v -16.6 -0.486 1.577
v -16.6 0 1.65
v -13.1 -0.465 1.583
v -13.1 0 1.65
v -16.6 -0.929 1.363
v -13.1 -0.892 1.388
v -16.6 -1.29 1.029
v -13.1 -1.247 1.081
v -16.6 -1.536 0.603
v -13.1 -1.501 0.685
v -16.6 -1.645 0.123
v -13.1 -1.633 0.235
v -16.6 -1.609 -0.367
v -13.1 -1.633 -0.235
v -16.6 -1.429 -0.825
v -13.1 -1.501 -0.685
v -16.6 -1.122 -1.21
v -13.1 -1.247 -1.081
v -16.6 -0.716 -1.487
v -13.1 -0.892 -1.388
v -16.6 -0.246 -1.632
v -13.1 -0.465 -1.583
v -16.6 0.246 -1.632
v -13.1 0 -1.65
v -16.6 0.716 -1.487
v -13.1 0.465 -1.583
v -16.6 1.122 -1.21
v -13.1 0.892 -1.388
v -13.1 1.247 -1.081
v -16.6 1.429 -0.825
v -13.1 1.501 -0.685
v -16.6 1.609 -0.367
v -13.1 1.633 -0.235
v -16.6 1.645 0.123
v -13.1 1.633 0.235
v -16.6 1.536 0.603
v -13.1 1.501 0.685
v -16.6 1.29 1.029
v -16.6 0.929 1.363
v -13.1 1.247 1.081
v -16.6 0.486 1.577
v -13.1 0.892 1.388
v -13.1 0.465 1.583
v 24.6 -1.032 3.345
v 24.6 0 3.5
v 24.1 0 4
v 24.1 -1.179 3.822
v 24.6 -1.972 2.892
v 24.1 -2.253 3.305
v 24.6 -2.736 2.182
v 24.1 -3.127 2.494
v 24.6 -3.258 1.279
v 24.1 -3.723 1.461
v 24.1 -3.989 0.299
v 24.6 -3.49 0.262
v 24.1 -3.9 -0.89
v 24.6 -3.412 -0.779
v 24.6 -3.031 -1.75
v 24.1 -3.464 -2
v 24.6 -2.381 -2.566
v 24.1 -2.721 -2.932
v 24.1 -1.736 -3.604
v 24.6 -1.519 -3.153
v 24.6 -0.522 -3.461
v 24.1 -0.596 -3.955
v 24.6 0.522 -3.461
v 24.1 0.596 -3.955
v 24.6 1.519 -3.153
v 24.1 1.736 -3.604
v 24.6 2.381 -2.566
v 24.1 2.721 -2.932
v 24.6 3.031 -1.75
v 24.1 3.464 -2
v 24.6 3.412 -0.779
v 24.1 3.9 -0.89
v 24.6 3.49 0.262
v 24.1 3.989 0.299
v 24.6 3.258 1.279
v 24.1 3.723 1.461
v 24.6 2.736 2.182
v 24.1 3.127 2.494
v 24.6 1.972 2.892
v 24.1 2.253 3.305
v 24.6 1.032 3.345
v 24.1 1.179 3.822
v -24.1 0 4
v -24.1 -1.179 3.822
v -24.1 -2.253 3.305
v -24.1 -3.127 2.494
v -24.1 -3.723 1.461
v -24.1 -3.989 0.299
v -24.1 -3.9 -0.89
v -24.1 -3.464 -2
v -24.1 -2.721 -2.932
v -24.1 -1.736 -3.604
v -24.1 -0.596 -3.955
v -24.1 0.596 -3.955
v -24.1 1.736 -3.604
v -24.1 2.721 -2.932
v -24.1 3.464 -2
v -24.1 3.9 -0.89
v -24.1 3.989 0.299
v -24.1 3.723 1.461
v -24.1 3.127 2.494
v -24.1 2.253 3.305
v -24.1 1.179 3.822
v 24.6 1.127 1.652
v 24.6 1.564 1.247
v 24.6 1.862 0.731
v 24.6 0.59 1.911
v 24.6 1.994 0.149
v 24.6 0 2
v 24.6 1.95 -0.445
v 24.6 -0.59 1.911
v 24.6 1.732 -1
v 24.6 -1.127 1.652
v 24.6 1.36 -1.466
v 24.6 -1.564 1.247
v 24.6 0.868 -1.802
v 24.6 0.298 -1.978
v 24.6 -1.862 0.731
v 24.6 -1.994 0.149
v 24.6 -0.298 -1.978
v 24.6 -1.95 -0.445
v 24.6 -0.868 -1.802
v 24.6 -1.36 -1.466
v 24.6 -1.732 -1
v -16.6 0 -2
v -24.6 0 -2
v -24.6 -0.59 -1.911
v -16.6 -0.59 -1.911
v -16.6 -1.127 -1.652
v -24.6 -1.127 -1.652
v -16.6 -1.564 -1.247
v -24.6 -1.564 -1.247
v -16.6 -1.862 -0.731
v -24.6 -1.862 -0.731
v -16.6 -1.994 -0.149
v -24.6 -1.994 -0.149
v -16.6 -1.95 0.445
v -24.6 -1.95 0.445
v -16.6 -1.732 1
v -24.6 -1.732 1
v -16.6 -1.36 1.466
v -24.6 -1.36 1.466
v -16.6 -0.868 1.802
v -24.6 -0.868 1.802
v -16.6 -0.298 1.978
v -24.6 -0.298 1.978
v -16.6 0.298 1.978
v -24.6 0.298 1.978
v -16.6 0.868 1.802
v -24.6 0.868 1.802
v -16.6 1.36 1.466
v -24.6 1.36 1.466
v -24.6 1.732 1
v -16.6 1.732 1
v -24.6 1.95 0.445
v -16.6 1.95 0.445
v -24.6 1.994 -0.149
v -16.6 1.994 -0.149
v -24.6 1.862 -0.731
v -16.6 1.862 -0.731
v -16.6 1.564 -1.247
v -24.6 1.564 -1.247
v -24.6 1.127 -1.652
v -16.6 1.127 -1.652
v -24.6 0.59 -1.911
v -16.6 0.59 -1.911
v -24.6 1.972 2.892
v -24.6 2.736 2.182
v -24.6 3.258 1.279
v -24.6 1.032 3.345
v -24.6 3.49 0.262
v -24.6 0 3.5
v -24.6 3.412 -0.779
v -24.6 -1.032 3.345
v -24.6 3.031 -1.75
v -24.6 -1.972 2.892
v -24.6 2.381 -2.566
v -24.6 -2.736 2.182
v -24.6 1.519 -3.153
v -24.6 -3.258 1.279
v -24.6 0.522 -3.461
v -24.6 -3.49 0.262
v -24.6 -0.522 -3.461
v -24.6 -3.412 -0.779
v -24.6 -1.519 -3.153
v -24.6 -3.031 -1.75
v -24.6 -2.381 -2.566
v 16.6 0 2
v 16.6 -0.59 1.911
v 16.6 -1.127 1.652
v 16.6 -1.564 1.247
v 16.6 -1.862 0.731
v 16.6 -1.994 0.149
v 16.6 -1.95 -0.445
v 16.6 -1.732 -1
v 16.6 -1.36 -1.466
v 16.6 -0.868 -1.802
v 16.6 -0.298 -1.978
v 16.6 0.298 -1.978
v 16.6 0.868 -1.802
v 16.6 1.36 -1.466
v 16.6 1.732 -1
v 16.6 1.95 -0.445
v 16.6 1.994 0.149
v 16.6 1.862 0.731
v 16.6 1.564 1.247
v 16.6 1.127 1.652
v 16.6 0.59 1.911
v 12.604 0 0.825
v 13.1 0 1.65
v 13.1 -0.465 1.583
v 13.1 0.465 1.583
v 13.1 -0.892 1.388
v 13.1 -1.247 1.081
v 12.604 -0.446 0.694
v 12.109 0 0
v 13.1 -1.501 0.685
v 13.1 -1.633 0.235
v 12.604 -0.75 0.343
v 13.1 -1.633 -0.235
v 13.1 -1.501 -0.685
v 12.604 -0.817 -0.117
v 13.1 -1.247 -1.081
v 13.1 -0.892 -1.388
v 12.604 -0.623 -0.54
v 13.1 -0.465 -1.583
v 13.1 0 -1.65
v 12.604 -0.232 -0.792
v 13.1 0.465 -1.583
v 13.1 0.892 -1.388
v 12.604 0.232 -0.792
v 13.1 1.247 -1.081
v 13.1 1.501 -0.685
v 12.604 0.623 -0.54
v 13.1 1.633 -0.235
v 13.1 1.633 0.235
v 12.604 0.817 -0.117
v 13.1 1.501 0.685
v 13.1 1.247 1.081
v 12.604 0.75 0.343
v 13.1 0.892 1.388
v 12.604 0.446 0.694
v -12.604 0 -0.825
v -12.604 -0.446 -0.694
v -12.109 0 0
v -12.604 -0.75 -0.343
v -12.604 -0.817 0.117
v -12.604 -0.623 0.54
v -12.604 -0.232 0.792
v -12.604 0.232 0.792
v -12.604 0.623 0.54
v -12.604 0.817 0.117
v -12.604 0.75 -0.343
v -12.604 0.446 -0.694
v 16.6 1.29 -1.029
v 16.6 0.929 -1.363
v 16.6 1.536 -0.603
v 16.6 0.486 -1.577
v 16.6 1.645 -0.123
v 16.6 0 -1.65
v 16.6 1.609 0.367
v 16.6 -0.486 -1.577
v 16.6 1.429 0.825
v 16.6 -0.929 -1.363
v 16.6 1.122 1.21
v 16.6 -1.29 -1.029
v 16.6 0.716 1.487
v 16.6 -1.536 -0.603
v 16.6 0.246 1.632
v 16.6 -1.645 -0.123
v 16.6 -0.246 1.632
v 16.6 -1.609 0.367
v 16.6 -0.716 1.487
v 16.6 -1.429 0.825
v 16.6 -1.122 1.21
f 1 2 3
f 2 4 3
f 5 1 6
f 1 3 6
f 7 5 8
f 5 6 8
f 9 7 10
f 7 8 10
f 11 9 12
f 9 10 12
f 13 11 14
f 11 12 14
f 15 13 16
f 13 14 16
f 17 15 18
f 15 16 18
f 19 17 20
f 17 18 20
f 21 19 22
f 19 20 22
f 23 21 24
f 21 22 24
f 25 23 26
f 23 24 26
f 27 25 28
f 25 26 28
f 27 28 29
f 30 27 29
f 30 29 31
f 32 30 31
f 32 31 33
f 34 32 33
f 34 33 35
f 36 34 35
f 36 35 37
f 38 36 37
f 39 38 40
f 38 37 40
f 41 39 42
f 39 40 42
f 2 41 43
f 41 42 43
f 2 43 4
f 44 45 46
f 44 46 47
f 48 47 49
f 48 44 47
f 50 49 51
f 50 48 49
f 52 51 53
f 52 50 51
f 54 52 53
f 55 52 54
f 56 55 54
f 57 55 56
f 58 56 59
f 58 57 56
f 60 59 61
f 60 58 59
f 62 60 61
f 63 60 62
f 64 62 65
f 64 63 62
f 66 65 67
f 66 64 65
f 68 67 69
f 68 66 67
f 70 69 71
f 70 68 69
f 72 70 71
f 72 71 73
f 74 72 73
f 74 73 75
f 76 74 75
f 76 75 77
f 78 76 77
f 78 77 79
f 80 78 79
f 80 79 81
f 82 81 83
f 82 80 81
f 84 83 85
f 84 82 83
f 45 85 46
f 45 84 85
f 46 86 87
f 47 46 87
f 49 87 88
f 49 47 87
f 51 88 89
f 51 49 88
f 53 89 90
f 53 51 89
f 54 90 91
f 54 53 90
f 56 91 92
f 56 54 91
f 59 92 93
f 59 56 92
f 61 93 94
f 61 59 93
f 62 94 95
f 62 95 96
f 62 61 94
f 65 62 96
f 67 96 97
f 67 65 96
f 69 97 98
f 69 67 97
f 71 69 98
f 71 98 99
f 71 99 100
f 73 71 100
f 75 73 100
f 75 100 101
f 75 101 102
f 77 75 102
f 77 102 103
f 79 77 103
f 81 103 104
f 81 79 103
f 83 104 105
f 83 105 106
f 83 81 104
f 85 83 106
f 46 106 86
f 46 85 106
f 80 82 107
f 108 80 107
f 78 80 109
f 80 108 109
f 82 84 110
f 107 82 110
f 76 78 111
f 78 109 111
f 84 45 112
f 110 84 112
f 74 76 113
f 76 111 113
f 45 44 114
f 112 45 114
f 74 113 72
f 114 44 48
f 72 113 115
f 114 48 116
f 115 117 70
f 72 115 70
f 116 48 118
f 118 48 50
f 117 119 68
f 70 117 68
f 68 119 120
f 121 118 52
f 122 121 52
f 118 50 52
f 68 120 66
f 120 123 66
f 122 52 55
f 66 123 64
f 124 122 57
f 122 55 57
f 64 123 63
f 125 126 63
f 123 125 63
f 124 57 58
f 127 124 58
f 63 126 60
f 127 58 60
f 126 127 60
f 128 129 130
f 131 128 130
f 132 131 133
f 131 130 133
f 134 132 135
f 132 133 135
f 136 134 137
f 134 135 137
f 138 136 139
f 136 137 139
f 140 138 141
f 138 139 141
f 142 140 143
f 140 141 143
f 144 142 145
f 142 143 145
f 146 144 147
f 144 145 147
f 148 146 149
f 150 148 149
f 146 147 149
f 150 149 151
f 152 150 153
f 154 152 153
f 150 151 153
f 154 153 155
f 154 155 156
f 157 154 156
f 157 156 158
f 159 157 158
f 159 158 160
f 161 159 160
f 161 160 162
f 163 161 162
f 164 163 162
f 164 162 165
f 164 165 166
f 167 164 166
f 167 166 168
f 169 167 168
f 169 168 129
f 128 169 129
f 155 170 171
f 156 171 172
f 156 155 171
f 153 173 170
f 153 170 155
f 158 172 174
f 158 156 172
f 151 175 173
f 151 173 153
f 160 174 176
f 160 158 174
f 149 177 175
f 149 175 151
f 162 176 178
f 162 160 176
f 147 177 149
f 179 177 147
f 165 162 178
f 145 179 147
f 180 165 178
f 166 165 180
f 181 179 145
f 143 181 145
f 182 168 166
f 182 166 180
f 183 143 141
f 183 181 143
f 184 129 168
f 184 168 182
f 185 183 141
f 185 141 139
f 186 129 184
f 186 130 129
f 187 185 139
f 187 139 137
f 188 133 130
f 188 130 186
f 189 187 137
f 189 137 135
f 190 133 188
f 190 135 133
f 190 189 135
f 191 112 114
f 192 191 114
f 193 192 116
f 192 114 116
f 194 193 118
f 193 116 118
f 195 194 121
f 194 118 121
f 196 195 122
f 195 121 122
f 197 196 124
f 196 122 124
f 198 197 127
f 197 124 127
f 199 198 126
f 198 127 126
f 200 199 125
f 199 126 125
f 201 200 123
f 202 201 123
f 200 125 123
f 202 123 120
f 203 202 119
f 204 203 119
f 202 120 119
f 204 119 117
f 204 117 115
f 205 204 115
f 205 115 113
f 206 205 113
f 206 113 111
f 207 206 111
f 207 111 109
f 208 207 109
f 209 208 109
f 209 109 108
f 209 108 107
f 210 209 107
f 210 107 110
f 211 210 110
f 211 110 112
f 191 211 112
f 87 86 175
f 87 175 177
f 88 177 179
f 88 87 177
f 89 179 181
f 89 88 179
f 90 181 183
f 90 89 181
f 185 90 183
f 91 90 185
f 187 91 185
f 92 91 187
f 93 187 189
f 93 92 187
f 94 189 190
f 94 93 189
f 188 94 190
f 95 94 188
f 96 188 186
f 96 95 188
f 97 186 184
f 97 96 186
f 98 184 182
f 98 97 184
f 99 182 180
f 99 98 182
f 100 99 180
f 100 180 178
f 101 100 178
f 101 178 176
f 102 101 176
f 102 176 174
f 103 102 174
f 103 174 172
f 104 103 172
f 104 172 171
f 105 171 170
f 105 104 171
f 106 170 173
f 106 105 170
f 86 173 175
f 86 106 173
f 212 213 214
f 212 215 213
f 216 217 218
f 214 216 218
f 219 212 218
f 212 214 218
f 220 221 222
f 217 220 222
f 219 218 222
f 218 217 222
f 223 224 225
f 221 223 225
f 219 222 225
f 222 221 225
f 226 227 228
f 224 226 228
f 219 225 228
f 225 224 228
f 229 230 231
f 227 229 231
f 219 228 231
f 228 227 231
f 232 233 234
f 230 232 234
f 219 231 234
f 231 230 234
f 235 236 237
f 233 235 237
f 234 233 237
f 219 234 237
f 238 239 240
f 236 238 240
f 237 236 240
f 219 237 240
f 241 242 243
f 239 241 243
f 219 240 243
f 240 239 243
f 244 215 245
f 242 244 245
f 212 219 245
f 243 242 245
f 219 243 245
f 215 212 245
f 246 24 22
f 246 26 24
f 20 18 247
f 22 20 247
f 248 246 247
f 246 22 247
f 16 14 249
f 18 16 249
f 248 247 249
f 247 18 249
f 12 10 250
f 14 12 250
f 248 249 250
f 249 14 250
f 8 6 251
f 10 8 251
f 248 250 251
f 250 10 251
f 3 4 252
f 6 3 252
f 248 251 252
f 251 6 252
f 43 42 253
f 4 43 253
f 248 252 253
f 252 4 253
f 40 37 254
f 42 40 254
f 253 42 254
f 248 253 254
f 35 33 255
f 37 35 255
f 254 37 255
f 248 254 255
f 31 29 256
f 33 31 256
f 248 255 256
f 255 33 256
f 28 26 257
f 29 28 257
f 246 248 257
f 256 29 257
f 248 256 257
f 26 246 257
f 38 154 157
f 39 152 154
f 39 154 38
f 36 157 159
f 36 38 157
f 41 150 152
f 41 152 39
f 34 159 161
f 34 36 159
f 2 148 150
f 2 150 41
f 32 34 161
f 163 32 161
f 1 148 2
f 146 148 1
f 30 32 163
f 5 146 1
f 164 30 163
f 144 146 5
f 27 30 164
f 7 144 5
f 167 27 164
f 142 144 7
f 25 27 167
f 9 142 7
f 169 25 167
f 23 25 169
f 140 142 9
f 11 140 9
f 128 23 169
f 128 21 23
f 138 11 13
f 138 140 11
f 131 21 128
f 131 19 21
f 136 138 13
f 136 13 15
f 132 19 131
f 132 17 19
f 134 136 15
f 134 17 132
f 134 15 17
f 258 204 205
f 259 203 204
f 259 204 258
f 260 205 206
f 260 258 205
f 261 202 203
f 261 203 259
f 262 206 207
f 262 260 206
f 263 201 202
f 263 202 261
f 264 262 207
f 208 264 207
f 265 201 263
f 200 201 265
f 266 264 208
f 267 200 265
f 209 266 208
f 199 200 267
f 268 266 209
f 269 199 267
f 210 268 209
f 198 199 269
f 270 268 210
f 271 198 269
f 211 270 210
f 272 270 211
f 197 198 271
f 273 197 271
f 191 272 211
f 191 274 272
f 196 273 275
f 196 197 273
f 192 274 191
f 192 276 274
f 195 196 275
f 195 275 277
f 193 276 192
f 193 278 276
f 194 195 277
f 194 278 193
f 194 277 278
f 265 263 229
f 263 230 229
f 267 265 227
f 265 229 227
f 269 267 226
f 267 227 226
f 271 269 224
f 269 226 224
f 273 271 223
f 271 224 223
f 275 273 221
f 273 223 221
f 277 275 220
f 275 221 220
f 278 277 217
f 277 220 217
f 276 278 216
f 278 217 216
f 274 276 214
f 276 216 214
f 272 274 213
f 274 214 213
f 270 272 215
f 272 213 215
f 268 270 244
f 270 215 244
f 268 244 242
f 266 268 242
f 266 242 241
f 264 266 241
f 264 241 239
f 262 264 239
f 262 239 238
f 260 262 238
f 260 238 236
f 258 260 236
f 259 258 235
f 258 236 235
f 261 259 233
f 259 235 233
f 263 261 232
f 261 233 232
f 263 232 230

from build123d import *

# Parameters (mm, degrees)
SKETCH_1_W                     = 49.2
SKETCH_1_H                     = 4
M4X0_7_1_D                     = 3.3
M4X0_7_1_DEPTH                 = 11.5
M4X0_7_1_CBORE_D               = 4
M4X0_7_1_CBORE_DEPTH           = 8
M4X0_7_1_TIP                   = 0.991420021
M4X0_7_1_ON_FACE_2_D           = 3.3
M4X0_7_1_ON_FACE_2_DEPTH       = 11.5
M4X0_7_1_ON_FACE_2_CBORE_D     = 4
M4X0_7_1_ON_FACE_2_CBORE_DEPTH = 8
M4X0_7_1_ON_FACE_2_TIP         = 0.991420021
CHAMFER_1_SIZE                 = 0.5


with BuildPart() as part:
    # ｽｹｯﾁ1 → 回転1 (revolve)
    with BuildSketch(Plane.XY, mode=Mode.PRIVATE) as revolve_1_sk:
        with Locations((0, 2)):
            Rectangle(SKETCH_1_W, SKETCH_1_H)
    revolve(revolve_1_sk.sketch.rotate(Axis((0, 0, 0), (1, 0, 0)), 90), axis=Axis((0, 0, 0), (1, 0, 0)))

    # M4x0.7 ねじ穴1
    with Locations(Plane(origin=(24.6, 0, 0), x_dir=(0, 0, 1), z_dir=(1, 0, 0))):
        with Locations((0, 0)):
            CounterBoreHole(M4X0_7_1_D / 2, M4X0_7_1_CBORE_D / 2, M4X0_7_1_CBORE_DEPTH, depth=M4X0_7_1_DEPTH)
            with Locations((0, 0, -(M4X0_7_1_DEPTH + M4X0_7_1_TIP / 2))):  # 118° drill point
                Cone(0, M4X0_7_1_D / 2, M4X0_7_1_TIP, mode=Mode.SUBTRACT)

    # M4x0.7 ねじ穴1 on face 2
    with Locations(Plane(origin=(-24.6, 0, 0), x_dir=(0, 0, -1), z_dir=(-1, 0, 0))):
        with Locations((0, 0)):
            CounterBoreHole(M4X0_7_1_ON_FACE_2_D / 2, M4X0_7_1_ON_FACE_2_CBORE_D / 2, M4X0_7_1_ON_FACE_2_CBORE_DEPTH, depth=M4X0_7_1_ON_FACE_2_DEPTH)
            with Locations((0, 0, -(M4X0_7_1_ON_FACE_2_DEPTH + M4X0_7_1_ON_FACE_2_TIP / 2))):  # 118° drill point
                Cone(0, M4X0_7_1_ON_FACE_2_D / 2, M4X0_7_1_ON_FACE_2_TIP, mode=Mode.SUBTRACT)

    # 面取り1
    chamfer_1_edges = [part.edges().sort_by_distance(p)[0] for p in [
        (24.6, 0, -4),
        (-24.6, 0, -4),
    ]]
    chamfer(chamfer_1_edges, length=CHAMFER_1_SIZE)


solid = part.part
